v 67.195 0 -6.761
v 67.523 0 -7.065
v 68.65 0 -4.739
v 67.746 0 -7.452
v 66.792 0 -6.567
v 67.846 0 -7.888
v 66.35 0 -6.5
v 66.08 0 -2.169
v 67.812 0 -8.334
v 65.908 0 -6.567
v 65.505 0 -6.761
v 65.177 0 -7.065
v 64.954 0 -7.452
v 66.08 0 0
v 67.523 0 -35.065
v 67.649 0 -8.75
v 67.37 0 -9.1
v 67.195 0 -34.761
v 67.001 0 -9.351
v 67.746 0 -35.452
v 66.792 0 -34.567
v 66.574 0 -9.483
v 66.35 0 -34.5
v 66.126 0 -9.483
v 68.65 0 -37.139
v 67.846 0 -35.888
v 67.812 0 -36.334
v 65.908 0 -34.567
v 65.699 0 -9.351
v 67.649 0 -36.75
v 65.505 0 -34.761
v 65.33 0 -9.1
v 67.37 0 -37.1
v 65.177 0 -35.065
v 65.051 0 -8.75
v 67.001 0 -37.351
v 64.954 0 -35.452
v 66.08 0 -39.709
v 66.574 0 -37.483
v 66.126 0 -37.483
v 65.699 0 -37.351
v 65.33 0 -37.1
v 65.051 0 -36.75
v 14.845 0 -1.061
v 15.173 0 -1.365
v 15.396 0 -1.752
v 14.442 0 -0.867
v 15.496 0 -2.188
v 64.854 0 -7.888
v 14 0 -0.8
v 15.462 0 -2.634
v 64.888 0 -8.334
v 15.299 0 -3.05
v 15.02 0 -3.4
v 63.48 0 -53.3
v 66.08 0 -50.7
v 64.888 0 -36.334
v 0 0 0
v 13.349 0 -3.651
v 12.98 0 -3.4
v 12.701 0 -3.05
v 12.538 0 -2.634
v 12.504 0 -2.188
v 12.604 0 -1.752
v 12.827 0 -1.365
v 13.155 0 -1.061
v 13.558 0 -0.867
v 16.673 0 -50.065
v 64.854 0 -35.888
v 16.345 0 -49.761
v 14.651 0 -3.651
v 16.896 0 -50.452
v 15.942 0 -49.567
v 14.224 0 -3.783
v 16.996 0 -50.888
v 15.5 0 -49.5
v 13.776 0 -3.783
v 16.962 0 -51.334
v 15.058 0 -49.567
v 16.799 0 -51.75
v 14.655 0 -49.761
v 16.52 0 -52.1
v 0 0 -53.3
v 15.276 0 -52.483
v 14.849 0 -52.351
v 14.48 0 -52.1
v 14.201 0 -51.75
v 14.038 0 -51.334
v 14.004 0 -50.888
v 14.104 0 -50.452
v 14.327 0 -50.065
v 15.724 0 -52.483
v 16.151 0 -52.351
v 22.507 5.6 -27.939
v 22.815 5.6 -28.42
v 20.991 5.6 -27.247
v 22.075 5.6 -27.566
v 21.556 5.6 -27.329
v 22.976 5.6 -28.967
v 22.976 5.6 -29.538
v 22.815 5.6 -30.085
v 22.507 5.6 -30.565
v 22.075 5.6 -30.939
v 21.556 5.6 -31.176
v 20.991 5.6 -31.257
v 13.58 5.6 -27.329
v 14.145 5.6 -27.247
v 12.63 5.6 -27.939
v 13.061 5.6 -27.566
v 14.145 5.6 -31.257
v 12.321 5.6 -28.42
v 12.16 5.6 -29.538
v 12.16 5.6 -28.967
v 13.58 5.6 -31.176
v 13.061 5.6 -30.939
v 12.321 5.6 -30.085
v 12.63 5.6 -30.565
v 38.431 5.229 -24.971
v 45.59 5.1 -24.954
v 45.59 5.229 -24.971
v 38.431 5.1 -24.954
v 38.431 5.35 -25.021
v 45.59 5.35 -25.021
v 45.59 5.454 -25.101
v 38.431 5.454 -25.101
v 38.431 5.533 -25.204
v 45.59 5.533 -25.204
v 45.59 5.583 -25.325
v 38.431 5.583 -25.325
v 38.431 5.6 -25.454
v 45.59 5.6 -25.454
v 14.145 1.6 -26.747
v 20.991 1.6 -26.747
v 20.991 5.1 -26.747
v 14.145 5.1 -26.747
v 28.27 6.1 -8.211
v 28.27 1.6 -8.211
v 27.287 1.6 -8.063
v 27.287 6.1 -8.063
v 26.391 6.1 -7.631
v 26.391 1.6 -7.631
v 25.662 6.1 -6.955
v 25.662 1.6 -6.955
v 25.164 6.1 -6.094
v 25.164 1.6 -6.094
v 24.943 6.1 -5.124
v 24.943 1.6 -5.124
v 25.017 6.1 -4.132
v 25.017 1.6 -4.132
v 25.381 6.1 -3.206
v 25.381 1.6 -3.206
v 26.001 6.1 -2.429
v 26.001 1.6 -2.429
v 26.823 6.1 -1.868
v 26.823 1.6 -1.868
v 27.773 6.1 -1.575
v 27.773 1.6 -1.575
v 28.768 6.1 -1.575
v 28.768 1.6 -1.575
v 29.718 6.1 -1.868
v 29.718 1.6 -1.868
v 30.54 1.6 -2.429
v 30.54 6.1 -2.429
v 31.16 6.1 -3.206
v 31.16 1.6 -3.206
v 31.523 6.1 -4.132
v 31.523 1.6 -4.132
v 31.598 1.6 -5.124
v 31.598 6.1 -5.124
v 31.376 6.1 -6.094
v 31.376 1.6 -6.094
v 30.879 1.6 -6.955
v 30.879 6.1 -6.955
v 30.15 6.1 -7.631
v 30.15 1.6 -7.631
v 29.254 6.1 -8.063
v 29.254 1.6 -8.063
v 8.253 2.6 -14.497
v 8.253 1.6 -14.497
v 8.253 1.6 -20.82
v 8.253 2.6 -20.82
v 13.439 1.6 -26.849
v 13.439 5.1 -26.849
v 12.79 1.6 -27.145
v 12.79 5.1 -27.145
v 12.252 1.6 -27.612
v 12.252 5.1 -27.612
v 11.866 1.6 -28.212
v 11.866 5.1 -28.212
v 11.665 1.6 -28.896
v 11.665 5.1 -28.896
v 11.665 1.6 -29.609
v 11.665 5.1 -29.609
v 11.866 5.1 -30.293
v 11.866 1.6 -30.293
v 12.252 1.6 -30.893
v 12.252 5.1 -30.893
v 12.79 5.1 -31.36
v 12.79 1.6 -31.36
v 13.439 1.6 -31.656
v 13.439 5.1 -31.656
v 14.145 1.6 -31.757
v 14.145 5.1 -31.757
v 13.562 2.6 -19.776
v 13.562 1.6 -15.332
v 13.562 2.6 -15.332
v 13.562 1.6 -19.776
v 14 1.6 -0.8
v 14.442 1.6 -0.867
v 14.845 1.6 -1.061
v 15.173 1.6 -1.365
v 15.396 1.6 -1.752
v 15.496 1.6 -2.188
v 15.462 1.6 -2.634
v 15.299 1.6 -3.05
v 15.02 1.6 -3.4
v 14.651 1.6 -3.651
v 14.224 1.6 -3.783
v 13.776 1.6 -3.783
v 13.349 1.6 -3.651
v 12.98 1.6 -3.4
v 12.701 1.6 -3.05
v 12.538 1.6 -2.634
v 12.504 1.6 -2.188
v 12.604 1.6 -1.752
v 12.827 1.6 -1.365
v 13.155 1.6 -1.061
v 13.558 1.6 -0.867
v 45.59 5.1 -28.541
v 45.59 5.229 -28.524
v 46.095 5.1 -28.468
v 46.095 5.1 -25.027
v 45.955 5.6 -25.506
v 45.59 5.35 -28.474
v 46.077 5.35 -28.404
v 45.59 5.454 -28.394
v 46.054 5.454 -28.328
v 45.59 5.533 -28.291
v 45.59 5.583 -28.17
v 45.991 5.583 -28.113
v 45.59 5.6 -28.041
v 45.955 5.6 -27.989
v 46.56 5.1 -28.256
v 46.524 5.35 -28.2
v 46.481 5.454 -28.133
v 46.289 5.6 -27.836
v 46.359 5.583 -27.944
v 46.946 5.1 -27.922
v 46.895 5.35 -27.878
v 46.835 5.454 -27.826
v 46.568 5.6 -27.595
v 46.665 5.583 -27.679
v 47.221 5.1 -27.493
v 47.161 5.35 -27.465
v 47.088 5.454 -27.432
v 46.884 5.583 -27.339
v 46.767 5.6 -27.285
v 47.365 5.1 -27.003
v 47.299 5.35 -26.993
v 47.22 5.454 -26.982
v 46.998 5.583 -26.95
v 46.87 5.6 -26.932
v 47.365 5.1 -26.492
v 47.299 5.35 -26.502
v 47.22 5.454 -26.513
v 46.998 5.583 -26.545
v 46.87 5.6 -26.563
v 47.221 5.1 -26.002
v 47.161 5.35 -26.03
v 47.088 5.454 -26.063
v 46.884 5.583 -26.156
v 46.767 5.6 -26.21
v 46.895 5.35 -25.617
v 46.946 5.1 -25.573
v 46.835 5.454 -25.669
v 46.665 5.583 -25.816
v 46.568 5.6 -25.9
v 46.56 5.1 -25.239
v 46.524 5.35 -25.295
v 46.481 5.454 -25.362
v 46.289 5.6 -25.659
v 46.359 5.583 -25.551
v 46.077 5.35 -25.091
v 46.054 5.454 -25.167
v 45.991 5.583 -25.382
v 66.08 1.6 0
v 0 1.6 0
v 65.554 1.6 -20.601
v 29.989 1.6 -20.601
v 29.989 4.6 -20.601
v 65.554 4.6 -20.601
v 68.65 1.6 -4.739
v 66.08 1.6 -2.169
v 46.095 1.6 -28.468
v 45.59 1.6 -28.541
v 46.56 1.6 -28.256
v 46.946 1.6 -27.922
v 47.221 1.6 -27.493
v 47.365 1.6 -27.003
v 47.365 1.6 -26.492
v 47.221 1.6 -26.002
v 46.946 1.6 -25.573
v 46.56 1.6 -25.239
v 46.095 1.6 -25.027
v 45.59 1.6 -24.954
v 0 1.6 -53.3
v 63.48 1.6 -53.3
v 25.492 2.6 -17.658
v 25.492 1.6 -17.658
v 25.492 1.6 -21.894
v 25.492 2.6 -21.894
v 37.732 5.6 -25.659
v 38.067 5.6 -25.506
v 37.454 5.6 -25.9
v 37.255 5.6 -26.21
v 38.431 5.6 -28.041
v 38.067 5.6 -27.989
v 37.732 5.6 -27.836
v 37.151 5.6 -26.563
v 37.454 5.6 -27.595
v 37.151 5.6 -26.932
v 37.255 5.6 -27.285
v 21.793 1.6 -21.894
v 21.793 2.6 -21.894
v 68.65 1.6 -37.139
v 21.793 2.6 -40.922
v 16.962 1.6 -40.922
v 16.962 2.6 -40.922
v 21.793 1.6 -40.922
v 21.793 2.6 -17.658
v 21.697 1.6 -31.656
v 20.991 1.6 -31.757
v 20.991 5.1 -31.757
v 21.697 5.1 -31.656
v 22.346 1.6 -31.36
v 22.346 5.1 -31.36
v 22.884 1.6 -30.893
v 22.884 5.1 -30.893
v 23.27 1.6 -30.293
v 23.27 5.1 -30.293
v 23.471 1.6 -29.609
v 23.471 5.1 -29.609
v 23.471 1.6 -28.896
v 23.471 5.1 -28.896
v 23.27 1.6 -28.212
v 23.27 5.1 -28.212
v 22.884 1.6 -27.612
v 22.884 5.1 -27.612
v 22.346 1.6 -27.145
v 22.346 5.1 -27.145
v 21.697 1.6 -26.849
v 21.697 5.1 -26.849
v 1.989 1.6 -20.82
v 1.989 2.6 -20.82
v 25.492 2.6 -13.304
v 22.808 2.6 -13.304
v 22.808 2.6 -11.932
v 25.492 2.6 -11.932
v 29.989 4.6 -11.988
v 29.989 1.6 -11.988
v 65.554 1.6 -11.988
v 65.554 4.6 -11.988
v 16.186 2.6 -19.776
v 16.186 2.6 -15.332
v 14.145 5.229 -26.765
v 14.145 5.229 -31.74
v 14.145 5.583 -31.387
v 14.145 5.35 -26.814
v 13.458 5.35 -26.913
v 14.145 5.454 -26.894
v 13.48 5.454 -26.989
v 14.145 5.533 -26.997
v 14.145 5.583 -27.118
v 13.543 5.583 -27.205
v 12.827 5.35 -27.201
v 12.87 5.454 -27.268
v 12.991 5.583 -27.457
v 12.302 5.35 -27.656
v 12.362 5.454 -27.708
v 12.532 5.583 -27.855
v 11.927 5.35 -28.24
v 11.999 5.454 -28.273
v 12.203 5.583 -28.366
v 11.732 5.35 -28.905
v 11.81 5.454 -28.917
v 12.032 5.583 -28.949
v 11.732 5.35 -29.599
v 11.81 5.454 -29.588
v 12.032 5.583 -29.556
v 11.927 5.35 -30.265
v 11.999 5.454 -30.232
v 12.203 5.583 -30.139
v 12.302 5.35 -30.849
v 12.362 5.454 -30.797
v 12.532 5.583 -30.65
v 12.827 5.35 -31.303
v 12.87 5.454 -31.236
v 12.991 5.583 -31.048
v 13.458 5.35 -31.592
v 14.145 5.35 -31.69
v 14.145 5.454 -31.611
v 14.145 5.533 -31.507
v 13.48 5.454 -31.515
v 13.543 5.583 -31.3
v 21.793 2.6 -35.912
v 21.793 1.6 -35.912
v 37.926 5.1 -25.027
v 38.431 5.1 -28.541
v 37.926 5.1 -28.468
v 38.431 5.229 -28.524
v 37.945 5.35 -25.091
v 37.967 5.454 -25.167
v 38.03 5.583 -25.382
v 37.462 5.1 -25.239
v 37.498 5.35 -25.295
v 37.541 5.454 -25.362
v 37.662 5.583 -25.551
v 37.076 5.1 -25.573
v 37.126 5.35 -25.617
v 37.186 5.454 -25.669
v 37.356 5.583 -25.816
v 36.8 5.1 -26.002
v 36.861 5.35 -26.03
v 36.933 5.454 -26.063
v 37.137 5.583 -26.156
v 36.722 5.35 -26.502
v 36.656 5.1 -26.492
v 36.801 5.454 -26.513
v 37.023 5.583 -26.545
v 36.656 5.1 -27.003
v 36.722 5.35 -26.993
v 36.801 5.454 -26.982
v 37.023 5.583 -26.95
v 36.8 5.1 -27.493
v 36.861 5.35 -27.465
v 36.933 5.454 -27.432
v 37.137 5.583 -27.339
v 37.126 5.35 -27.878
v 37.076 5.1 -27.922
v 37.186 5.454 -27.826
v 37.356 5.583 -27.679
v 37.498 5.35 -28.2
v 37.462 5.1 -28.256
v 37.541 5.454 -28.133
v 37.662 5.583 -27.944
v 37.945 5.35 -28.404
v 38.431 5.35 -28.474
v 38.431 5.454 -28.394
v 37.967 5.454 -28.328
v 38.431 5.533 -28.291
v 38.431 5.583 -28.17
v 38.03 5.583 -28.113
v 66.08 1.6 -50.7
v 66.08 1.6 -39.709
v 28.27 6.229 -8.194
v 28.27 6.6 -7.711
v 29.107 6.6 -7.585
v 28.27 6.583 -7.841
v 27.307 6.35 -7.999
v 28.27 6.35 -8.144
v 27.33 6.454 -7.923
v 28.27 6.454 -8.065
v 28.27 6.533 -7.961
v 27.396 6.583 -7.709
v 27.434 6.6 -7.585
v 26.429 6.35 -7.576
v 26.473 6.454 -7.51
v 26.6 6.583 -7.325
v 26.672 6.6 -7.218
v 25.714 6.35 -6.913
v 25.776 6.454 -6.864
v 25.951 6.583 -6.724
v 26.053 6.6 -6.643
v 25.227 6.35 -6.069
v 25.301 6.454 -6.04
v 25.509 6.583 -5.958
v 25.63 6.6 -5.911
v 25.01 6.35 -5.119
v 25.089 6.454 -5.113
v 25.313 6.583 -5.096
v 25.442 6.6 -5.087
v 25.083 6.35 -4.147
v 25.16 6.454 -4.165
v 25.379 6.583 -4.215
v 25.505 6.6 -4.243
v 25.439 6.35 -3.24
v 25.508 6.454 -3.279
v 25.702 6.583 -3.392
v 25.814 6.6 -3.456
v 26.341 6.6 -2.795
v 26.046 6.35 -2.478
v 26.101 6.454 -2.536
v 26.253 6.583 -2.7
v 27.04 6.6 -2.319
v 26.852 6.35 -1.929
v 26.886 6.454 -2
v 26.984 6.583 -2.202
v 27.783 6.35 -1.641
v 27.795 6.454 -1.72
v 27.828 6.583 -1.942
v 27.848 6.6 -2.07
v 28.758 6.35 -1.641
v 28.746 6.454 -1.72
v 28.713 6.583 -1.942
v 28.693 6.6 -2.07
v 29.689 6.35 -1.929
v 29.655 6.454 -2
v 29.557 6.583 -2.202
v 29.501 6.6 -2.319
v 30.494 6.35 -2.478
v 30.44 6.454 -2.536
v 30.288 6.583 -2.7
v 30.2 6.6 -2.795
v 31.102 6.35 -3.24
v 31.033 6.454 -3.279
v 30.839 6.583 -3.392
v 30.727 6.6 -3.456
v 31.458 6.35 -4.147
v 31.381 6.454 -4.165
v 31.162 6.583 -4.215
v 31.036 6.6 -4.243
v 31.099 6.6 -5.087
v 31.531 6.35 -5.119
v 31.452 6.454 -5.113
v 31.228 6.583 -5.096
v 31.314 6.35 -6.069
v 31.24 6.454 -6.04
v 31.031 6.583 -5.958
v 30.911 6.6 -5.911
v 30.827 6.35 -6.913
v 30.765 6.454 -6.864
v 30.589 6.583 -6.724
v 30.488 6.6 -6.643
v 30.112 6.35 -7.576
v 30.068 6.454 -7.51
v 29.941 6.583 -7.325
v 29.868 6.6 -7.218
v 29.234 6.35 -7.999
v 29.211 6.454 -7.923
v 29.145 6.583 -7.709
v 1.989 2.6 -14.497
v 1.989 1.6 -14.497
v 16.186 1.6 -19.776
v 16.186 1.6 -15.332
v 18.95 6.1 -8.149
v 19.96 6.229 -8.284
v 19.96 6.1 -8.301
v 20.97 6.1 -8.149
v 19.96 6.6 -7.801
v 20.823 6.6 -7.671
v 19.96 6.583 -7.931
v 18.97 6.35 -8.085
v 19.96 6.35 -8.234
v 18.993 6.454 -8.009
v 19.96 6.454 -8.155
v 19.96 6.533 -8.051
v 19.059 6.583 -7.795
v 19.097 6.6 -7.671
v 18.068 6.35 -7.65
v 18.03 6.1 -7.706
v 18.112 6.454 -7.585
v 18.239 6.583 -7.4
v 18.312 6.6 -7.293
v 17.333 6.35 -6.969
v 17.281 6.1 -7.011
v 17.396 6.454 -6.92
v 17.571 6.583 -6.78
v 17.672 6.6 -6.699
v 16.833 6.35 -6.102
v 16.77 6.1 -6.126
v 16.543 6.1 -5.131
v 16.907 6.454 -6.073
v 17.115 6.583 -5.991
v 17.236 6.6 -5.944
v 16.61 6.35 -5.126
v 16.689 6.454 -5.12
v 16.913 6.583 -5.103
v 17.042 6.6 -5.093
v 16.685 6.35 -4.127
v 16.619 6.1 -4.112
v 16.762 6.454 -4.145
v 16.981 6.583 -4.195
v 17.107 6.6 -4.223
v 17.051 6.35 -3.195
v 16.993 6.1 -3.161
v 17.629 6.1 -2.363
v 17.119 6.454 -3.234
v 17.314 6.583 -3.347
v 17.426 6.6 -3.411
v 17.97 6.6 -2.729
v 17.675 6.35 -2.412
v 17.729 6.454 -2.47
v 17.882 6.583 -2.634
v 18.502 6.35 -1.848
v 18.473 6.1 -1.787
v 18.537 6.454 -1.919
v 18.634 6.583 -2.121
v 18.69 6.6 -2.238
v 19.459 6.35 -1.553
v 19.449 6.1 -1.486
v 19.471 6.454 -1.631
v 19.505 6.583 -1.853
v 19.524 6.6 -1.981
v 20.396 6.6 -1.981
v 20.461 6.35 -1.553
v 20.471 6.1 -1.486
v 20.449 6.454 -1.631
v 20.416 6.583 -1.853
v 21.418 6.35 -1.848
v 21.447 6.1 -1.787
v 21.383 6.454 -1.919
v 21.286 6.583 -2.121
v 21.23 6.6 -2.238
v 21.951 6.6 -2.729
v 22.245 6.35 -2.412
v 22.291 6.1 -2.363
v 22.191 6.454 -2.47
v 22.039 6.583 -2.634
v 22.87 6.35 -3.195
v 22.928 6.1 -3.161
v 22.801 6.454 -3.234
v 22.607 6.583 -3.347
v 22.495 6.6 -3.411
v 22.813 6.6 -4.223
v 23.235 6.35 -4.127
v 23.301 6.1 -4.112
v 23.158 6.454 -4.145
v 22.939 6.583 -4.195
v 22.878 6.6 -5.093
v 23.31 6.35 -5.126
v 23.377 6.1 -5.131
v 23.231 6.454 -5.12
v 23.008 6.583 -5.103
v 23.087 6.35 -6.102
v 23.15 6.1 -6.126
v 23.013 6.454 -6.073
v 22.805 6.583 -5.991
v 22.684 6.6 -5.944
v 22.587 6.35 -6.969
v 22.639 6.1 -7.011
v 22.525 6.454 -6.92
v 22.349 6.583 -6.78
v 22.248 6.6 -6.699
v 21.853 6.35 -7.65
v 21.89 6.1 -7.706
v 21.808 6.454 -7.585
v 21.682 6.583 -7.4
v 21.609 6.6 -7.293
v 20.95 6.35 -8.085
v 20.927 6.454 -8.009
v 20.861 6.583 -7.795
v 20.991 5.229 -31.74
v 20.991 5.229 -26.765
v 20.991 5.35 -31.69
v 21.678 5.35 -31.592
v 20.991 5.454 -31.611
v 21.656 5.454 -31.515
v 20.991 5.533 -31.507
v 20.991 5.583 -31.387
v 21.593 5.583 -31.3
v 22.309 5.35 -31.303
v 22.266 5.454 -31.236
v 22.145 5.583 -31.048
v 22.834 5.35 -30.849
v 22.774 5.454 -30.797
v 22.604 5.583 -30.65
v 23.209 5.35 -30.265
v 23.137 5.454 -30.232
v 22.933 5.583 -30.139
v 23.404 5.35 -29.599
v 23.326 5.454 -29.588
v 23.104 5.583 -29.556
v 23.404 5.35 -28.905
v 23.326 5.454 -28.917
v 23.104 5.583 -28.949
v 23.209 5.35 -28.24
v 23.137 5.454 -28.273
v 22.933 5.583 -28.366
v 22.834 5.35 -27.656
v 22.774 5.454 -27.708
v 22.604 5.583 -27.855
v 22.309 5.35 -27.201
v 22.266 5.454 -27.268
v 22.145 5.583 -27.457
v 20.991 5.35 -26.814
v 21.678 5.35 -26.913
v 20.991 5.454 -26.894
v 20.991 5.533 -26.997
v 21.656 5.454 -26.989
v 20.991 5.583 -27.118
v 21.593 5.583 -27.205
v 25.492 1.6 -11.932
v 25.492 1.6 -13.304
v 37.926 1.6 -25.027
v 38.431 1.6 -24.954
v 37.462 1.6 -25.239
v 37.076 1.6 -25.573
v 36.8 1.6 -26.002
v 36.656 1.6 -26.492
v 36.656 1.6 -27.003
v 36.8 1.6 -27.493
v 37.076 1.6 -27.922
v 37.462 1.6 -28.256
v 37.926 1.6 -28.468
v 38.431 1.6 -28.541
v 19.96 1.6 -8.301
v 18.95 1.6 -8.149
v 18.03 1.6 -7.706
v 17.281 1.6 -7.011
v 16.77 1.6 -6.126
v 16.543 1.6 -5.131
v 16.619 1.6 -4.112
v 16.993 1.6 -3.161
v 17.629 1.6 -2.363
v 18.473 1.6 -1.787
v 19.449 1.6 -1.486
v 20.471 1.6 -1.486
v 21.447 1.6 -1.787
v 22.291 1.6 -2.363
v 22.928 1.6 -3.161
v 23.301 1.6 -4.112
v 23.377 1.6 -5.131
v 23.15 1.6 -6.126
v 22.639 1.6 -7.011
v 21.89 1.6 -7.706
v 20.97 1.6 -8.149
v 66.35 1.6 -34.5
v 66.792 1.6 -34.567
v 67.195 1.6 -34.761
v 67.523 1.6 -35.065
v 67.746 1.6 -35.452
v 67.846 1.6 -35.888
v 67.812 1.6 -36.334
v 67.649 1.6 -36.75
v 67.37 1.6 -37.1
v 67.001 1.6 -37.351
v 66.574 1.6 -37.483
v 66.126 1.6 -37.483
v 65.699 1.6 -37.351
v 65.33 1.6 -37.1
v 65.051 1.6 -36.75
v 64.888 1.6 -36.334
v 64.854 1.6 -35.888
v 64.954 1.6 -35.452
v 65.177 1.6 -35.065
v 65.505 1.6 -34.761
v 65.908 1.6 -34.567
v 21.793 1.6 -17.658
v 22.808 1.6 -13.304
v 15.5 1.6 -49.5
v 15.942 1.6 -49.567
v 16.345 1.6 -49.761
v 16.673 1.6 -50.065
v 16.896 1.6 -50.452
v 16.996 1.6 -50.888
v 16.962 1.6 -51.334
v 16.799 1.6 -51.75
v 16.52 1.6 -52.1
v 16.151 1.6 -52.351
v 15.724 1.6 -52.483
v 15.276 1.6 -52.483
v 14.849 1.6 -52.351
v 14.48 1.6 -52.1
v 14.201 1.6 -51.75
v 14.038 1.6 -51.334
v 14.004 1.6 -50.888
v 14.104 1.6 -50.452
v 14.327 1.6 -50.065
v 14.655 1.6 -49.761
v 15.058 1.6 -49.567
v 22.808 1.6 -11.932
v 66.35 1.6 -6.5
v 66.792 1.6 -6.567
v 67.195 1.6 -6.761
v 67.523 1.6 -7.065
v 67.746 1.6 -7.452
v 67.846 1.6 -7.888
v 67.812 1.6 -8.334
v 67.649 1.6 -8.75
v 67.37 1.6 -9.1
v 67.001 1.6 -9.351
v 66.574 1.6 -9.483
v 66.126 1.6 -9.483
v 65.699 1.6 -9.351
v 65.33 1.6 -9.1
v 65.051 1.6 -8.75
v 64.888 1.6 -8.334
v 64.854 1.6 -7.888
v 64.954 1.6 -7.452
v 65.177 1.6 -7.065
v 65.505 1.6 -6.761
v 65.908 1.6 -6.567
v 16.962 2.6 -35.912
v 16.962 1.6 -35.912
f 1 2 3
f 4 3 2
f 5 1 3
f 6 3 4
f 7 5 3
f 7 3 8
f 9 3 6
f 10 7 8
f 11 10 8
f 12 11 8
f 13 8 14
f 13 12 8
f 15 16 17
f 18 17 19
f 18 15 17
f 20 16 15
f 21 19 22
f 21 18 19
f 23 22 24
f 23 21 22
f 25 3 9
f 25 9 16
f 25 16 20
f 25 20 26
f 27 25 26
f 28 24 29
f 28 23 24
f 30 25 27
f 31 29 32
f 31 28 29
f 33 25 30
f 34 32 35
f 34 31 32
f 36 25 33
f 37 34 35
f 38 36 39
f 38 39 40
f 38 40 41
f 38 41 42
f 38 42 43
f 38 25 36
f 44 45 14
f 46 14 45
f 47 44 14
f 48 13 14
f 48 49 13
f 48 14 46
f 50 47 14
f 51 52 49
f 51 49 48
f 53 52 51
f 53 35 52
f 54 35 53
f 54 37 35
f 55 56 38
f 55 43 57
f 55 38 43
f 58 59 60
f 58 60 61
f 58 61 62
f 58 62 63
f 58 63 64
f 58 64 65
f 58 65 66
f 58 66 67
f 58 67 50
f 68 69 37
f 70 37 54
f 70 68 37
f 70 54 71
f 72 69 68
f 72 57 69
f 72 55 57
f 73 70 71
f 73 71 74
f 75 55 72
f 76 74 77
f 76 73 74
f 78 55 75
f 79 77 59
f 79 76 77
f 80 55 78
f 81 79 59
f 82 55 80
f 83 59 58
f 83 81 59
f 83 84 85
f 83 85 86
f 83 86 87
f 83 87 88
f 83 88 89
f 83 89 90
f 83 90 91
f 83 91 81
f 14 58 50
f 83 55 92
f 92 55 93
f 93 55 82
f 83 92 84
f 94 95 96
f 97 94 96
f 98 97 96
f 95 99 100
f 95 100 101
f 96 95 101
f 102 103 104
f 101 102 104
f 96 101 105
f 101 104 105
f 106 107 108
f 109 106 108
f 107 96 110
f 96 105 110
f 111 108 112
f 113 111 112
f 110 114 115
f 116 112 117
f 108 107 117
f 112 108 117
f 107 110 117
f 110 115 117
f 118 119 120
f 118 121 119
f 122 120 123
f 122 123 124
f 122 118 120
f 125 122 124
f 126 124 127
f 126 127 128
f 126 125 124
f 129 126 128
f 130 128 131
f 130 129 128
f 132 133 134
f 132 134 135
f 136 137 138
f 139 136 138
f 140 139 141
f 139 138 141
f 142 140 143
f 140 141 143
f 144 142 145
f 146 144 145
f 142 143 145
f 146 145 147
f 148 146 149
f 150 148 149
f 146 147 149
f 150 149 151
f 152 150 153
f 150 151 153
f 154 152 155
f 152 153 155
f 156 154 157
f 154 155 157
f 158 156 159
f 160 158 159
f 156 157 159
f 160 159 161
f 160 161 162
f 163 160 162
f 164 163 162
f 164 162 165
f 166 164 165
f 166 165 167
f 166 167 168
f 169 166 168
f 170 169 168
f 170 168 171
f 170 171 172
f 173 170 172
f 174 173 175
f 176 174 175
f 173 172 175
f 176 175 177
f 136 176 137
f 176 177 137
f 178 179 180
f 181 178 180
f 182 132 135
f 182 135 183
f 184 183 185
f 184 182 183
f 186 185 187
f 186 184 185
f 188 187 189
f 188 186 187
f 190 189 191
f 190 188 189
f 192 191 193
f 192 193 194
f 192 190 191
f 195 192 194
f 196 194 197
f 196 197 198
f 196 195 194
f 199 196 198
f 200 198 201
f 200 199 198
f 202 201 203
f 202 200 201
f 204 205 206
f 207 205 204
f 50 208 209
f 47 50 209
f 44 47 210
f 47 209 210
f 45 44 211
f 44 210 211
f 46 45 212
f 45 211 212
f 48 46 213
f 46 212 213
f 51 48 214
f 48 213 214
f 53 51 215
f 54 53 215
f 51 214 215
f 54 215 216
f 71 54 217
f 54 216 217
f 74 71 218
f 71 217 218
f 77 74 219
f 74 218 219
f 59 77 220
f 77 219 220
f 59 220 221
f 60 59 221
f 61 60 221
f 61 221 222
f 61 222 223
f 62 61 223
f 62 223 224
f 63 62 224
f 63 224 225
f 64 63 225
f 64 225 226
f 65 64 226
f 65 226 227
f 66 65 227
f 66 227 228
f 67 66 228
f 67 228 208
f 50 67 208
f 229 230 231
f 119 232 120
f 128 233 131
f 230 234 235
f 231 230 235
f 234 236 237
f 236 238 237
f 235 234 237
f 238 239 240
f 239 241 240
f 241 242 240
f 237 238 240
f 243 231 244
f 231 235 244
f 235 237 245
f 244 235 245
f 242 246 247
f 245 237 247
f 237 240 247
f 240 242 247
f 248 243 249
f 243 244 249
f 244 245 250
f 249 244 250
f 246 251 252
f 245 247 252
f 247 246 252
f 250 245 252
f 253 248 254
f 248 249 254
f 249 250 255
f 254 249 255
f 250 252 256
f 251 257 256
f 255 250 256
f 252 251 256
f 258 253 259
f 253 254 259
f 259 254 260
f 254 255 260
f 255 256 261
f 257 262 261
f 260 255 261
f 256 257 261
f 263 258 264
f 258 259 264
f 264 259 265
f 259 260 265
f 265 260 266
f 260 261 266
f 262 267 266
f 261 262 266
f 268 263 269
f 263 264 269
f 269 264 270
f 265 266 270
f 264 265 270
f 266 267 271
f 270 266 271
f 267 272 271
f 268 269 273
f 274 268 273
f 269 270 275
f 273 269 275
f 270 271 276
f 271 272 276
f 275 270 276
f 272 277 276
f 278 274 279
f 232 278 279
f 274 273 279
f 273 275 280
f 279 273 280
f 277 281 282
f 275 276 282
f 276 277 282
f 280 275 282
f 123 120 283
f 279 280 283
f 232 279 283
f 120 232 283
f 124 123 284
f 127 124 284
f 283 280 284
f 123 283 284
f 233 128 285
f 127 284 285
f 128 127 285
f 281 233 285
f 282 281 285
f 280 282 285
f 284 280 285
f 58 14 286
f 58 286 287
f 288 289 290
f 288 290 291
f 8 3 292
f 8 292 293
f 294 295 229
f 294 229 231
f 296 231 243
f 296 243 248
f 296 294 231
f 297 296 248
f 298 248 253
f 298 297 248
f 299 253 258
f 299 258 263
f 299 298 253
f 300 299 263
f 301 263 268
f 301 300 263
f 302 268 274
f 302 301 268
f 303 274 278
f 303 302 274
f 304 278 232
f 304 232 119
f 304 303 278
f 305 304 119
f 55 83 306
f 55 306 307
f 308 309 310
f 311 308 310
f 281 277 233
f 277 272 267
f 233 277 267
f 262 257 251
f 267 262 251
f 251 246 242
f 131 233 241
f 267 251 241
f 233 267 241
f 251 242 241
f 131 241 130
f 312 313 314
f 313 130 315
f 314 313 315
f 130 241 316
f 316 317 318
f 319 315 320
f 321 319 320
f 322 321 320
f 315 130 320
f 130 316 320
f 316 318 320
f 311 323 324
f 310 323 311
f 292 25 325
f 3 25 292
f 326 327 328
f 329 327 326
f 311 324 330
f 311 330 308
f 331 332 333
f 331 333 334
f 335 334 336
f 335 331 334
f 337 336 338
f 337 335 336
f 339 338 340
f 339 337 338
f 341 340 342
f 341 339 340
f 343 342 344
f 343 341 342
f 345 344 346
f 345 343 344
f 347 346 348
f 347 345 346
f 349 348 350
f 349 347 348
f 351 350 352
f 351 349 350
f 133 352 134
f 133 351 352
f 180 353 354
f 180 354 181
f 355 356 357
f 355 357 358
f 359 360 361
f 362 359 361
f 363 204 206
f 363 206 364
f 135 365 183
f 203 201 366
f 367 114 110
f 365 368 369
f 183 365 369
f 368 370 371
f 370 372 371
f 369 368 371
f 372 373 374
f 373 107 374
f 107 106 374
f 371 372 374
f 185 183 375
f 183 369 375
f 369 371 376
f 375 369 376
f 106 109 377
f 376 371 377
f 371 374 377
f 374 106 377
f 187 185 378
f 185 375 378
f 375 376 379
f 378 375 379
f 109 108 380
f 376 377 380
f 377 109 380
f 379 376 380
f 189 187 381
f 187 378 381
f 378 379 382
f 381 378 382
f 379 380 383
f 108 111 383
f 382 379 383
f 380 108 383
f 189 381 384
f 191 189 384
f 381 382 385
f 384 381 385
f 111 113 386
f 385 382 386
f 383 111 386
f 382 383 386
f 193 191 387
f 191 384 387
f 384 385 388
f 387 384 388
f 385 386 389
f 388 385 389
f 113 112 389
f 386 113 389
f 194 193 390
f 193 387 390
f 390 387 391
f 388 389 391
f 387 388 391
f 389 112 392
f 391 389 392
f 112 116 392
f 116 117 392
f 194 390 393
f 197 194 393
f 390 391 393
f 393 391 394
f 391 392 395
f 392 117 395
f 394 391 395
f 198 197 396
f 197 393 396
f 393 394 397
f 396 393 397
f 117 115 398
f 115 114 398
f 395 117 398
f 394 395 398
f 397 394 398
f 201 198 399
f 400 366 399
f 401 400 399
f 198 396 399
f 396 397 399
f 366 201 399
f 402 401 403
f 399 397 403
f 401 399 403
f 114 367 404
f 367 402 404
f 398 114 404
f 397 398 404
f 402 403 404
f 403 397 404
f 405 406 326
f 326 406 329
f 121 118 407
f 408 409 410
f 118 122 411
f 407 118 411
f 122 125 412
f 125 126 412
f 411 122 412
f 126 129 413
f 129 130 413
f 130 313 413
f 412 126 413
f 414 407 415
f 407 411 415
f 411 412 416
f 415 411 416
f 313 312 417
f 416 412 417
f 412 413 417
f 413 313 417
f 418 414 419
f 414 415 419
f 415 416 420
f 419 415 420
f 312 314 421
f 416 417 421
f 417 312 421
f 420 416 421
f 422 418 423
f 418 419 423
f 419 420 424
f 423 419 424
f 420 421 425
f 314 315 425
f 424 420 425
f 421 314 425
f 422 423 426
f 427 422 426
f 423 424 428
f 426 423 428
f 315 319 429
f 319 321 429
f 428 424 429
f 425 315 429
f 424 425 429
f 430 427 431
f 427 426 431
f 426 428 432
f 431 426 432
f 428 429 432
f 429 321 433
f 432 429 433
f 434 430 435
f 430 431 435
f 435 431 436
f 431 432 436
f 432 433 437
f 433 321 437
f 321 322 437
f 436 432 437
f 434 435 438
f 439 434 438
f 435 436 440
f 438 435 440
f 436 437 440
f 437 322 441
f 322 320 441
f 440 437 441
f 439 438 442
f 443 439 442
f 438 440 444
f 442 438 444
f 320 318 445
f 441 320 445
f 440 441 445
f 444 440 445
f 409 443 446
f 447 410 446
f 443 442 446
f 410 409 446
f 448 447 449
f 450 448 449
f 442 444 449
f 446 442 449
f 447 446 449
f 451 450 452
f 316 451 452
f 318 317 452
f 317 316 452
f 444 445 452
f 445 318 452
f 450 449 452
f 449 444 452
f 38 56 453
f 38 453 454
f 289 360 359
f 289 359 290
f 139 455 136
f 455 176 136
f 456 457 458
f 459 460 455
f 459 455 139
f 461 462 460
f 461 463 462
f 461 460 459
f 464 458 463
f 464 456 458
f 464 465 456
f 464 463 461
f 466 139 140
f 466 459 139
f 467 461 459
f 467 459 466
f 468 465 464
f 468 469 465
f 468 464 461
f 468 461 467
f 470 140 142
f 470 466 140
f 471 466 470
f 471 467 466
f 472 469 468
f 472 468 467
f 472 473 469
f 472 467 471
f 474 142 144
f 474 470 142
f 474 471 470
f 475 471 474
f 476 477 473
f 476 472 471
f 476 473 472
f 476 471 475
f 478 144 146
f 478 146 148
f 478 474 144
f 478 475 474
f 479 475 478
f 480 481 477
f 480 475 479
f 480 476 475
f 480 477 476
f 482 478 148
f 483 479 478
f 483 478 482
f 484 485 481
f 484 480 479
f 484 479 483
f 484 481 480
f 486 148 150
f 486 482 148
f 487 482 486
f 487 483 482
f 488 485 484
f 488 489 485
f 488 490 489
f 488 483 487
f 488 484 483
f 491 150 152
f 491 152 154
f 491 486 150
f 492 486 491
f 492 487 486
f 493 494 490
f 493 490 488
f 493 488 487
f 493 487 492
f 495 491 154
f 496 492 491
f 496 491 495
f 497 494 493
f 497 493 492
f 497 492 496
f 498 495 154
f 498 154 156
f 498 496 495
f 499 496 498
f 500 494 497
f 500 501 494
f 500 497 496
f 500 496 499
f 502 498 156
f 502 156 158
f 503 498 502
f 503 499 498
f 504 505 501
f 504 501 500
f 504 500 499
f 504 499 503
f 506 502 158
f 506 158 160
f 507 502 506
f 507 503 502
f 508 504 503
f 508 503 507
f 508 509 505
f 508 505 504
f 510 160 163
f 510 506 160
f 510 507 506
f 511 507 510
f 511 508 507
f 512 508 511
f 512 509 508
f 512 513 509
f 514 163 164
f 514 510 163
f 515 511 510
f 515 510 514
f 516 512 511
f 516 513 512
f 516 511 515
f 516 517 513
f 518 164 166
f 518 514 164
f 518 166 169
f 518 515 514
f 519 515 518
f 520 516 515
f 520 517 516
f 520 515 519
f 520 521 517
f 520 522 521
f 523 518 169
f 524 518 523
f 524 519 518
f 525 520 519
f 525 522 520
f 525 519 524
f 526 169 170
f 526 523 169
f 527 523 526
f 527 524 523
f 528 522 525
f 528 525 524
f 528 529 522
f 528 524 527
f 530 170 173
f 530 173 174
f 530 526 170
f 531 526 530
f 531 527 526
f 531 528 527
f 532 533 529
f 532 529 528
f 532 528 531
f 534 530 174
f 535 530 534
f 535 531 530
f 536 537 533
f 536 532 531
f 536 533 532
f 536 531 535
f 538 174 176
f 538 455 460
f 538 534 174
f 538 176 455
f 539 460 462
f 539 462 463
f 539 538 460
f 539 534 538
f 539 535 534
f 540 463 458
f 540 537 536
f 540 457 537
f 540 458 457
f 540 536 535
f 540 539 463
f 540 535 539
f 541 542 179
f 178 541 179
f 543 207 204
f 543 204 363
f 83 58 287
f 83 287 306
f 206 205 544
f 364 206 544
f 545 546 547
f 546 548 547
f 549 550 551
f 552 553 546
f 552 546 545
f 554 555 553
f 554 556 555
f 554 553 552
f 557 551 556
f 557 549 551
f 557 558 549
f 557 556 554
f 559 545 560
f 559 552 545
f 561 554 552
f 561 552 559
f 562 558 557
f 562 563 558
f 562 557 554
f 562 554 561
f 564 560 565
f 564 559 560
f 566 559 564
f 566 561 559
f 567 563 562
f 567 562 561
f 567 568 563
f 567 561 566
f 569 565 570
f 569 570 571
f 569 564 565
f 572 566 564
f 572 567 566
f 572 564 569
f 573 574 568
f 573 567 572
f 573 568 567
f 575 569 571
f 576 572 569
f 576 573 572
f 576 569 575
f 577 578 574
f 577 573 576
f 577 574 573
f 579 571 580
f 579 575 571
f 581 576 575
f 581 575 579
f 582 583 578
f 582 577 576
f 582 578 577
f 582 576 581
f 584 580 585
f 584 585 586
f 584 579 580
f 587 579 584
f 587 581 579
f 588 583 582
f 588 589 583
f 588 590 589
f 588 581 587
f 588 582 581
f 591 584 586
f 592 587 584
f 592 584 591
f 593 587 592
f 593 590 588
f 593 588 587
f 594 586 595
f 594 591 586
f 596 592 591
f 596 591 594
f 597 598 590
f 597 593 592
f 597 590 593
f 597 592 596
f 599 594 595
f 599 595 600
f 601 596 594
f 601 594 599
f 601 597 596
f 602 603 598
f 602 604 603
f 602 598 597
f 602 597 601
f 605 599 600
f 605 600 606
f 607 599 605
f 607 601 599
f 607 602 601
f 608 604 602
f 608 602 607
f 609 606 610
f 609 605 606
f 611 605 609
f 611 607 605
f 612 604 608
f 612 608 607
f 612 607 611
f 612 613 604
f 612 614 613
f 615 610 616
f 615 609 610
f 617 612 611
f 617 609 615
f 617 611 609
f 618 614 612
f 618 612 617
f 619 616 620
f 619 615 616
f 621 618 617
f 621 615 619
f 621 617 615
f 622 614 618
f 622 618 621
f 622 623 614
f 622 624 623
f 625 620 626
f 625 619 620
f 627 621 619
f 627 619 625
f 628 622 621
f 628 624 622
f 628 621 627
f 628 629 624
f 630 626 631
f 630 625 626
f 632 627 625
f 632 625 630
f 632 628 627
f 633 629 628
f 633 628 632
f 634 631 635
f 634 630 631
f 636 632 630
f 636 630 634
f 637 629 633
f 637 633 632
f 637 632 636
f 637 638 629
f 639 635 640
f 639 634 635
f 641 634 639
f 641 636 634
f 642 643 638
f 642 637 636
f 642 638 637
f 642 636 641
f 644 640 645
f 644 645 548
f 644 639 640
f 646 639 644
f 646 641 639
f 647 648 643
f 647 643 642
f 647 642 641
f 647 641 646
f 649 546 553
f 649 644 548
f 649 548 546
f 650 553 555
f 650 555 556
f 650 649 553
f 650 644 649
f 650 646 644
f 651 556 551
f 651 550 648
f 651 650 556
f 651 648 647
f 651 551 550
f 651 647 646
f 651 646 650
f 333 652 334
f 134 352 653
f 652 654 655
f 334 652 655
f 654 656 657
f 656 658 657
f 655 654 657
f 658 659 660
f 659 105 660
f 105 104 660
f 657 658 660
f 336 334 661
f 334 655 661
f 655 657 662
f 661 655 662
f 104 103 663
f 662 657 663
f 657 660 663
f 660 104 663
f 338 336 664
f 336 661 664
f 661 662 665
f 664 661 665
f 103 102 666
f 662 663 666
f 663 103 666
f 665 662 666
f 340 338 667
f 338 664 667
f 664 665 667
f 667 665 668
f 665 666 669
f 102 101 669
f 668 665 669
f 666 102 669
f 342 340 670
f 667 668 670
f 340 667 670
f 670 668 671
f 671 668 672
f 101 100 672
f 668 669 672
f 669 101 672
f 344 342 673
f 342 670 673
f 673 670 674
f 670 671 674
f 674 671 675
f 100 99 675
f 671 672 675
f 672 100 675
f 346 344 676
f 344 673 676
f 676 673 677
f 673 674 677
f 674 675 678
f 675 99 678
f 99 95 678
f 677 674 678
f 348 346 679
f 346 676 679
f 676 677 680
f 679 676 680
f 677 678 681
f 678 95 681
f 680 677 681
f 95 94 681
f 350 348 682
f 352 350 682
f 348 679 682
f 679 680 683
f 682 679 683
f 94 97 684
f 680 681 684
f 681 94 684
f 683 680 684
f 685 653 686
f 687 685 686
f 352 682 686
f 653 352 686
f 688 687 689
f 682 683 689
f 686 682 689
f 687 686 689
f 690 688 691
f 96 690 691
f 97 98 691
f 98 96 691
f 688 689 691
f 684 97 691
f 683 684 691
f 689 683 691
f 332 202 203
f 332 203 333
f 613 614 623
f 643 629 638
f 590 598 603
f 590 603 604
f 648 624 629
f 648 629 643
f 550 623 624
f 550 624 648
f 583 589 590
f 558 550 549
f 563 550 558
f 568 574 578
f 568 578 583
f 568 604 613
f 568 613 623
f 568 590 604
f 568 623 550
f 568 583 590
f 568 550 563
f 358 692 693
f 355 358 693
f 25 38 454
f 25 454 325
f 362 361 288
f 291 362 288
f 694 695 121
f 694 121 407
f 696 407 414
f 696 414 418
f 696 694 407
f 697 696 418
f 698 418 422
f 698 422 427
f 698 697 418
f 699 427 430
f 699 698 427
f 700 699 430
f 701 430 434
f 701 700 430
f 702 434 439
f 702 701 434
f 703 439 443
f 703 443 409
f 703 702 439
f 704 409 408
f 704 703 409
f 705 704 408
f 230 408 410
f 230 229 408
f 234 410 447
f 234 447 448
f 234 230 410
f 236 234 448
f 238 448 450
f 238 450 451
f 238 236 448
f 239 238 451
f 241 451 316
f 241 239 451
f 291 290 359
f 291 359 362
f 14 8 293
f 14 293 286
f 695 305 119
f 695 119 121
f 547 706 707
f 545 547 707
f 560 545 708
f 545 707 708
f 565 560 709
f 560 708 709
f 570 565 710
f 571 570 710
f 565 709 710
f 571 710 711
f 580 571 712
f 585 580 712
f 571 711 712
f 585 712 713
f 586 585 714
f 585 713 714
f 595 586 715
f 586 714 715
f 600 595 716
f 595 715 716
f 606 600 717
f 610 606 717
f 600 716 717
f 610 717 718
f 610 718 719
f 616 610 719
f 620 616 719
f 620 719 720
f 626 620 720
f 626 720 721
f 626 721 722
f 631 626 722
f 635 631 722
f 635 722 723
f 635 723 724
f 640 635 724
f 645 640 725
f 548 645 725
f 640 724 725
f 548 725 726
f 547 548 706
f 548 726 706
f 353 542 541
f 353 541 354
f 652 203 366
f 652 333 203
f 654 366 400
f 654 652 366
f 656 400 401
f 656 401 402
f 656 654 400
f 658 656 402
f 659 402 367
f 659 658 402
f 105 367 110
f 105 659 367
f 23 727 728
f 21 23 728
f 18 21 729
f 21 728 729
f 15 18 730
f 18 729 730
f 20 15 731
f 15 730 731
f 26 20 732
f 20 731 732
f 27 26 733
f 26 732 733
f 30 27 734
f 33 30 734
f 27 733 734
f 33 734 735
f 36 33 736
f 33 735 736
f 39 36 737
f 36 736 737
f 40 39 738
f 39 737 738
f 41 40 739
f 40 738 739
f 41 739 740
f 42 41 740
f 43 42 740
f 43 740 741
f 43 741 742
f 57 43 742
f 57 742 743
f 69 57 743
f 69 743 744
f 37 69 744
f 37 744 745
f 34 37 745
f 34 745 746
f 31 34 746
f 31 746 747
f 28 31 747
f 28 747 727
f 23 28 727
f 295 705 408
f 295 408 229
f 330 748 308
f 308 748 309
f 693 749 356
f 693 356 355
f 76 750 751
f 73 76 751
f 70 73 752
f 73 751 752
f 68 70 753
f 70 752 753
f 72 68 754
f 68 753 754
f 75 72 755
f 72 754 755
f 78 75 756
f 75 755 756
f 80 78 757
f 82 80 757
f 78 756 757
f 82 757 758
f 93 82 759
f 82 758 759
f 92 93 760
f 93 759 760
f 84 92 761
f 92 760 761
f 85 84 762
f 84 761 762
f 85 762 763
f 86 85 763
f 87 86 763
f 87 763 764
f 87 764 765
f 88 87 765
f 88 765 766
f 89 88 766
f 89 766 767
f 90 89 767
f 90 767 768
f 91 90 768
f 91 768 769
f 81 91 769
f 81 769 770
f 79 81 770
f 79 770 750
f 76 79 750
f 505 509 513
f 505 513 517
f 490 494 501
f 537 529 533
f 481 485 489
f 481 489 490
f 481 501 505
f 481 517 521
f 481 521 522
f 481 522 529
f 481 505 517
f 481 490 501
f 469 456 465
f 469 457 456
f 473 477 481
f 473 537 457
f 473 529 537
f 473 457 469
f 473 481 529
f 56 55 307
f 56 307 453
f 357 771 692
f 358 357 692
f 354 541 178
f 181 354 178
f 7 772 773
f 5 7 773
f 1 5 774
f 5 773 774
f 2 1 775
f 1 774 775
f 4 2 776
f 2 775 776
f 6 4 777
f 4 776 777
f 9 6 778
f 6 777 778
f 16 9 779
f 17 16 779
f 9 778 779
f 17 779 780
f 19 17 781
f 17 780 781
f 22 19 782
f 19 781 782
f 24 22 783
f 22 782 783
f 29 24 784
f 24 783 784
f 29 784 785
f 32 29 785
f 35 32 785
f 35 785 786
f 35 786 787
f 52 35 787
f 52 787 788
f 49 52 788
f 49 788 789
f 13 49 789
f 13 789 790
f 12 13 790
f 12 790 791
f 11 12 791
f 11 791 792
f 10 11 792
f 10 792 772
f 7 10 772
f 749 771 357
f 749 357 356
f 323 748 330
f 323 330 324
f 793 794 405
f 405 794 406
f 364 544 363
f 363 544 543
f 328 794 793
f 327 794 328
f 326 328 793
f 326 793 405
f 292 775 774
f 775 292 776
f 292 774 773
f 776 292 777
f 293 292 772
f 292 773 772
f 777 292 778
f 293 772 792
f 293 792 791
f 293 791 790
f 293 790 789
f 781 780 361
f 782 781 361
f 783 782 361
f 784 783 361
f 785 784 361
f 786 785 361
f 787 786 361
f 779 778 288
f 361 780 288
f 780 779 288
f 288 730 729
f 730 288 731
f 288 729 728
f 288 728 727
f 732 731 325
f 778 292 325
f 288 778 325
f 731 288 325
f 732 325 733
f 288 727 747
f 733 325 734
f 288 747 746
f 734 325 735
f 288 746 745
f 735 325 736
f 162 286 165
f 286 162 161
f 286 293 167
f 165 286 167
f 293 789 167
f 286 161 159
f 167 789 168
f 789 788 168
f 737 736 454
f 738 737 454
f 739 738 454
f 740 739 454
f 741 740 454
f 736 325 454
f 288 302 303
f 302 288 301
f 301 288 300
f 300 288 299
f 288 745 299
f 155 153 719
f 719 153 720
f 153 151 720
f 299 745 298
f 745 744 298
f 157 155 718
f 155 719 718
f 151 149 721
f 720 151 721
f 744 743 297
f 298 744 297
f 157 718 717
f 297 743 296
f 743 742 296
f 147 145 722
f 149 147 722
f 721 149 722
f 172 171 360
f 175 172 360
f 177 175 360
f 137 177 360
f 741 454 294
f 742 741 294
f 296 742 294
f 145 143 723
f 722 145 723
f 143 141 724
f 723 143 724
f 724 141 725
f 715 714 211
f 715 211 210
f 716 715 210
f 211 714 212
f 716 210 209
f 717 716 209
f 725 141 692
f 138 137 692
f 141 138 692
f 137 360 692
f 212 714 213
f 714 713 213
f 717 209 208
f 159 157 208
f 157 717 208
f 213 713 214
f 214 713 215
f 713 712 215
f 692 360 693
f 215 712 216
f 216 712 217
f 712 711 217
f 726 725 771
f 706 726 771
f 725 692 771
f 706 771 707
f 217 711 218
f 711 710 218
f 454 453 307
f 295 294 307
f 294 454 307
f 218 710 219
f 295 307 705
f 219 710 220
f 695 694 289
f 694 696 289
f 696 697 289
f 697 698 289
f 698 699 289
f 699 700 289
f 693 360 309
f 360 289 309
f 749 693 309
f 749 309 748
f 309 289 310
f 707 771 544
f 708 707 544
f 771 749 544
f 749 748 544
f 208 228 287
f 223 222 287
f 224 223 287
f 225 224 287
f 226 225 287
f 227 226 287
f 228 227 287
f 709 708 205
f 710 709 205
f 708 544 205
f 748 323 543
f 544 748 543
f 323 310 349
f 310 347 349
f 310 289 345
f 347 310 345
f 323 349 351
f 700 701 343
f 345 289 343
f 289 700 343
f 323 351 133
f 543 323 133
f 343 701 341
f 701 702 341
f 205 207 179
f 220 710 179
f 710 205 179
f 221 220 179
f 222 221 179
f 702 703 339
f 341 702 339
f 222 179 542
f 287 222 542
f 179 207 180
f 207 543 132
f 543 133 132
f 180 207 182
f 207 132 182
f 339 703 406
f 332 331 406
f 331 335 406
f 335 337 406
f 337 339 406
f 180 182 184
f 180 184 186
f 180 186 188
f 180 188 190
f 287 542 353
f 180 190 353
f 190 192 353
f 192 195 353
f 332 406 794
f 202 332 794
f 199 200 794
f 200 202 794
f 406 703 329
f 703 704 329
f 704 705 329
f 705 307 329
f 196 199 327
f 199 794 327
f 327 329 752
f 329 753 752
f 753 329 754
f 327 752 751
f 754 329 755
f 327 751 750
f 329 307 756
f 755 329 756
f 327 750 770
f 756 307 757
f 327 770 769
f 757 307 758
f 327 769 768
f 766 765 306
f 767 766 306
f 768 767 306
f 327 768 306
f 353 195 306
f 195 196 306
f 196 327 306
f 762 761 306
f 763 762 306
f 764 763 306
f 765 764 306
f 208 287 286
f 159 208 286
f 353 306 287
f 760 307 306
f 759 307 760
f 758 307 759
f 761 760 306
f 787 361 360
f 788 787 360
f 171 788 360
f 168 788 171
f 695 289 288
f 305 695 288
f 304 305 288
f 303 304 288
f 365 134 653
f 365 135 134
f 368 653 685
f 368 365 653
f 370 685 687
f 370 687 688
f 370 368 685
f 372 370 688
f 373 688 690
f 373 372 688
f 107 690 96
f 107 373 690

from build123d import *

# Parameters (mm, degrees)
SALIENTE_EXTRUIR1_DEPTH = 1.6
CHAFL_N1_SIZE           = 2.6
CROQUIS2_R              = 1.5
CORTAR_EXTRUIR1_DEPTH   = 87.926822673
CROQUIS3_W              = 35.565034919
CROQUIS3_H              = 8.613377017
SALIENTE_EXTRUIR2_DEPTH = 3
CROQUIS4_R              = 3.336672647
CROQUIS4_R_2            = 3.426556793
SALIENTE_EXTRUIR3_DEPTH = 5
CROQUIS5_W              = 6.263410385
CROQUIS5_H              = 6.323061912
CROQUIS5_W_2            = 3.698394703
CROQUIS5_H_2            = 4.23525845
CROQUIS5_W_3            = 2.624667209
CROQUIS5_H_3            = 4.444038797
CROQUIS5_W_4            = 2.684318736
CROQUIS5_H_4            = 1.371985132
CROQUIS5_W_5            = 4.831773725
CROQUIS5_H_5            = 5.010728307
SALIENTE_EXTRUIR4_DEPTH = 1
SALIENTE_EXTRUIR5_DEPTH = 4
REDONDEO1_R             = 0.5


with BuildPart() as part:
    # Croquis1 → Saliente-Extruir1 (new body)
    with BuildSketch(Plane(origin=(0, 0, 0), x_dir=(1, 0, 0), z_dir=(0, 1, 0))):
        Polygon((0, 53.3), (66.08, 53.3), (66.08, 39.738845798), (68.65, 39.738845798), (68.65, 2.138845798), (66.08, 2.138845798), (66.08, 0), (0, 0), align=None)
    extrude(amount=SALIENTE_EXTRUIR1_DEPTH)

    # Chaflán1
    # the kernel refuses this chamfer: 2.6 mm, written as the material it takes off along each edge
    with BuildSketch(Plane(origin=(68.65, -6.686375769, -39.738845798), x_dir=(-0.9996219169112966, 0, -0.027495876610585446), z_dir=(0, 1, 0))) as chafl_n1_piece_1_section:
        Polygon((CHAFL_N1_SIZE * 0.999621916911, CHAFL_N1_SIZE * 0.0274958766106), (-CHAFL_N1_SIZE * 0.0274958766106, CHAFL_N1_SIZE * 0.999621916911), (0, 0), align=None)
    chafl_n1_piece_1 = extrude(amount=14.972751537, mode=Mode.PRIVATE)
    chafl_n1_piece_1 = split(chafl_n1_piece_1, bisect_by=Plane(origin=(66.08, 0.8, -38.878812764), z_dir=(1, 0, 0)), keep=Keep.TOP, mode=Mode.PRIVATE)
    add(chafl_n1_piece_1, mode=Mode.SUBTRACT)
    with BuildSketch(Plane(origin=(68.65, -6.686375769, -2.138845798), x_dir=(0.027495876610585345, 0, -0.9996219169112966), z_dir=(0, 1, 0))) as chafl_n1_piece_2_section:
        Polygon((CHAFL_N1_SIZE * 0.999621916911, CHAFL_N1_SIZE * 0.0274958766106), (-CHAFL_N1_SIZE * 0.0274958766106, CHAFL_N1_SIZE * 0.999621916911), (0, 0), align=None)
    chafl_n1_piece_2 = extrude(amount=14.972751537, mode=Mode.PRIVATE)
    chafl_n1_piece_2 = split(chafl_n1_piece_2, bisect_by=Plane(origin=(66.08, 0.8, -2.998878832), z_dir=(1, 0, 0)), keep=Keep.TOP, mode=Mode.PRIVATE)
    add(chafl_n1_piece_2, mode=Mode.SUBTRACT)
    with BuildSketch(Plane(origin=(66.08, -6.686375769, -53.3), x_dir=(-0.9996219169112966, 0, -0.027495876610585373), z_dir=(0, 1, 0))) as chafl_n1_piece_3:
        Polygon((CHAFL_N1_SIZE * 0.999621916911, CHAFL_N1_SIZE * 0.0274958766106), (-CHAFL_N1_SIZE * 0.0274958766106, CHAFL_N1_SIZE * 0.999621916911), (0, 0), align=None)
    extrude(amount=14.972751537, mode=Mode.SUBTRACT)

    # Croquis2 → Cortar-Extruir1 (cut, through all)
    with BuildSketch(Plane(origin=(0, 1.6, 0), x_dir=(1, 0, 0), z_dir=(0, 1, 0))):
        with Locations(Location((15.5, 51, 0), (0, 0, 270))):
            Circle(CROQUIS2_R)
        with Locations(Location((66.35, 36, 0), (0, 0, 270))):
            Circle(CROQUIS2_R)
        with Locations(Location((66.35, 8, 0), (0, 0, 270))):
            Circle(CROQUIS2_R)
        with Locations(Location((14, 2.3, 0), (0, 0, 270))):
            Circle(CROQUIS2_R)
    extrude(amount=-CORTAR_EXTRUIR1_DEPTH, mode=Mode.SUBTRACT)

    # Croquis3 → Saliente-Extruir2 (add)
    with BuildSketch(Plane(origin=(0, 1.6, 0), x_dir=(1, 0, 0), z_dir=(0, 1, 0))):
        with Locations((47.771511194, 16.294435422)):
            Rectangle(CROQUIS3_W, CROQUIS3_H)
    extrude(amount=SALIENTE_EXTRUIR2_DEPTH)

    # Croquis4 → Saliente-Extruir3 (add)
    with BuildSketch(Plane(origin=(0, 1.6, 0), x_dir=(1, 0, 0), z_dir=(0, 1, 0))):
        with Locations(Location((28.27044436, 4.874550457, 0), (0, 0, 90))):
            Circle(CROQUIS4_R)
        with Locations(Location((19.960106187, 4.874550457, 0), (0, 0, 90))):
            Circle(CROQUIS4_R_2)
    extrude(amount=SALIENTE_EXTRUIR3_DEPTH)

    # Croquis5 → Saliente-Extruir4 (add)
    with BuildSketch(Plane(origin=(0, 1.6, 0), x_dir=(1, 0, 0), z_dir=(0, 1, 0))):
        with Locations((5.120871528, 17.658331847)):
            Rectangle(CROQUIS5_W, CROQUIS5_H)
        with Locations((23.642670808, 19.775961072)):
            Rectangle(CROQUIS5_W_2, CROQUIS5_H_2)
        with Locations((14.87389627, 17.553941673)):
            Rectangle(CROQUIS5_W_3, CROQUIS5_H_3)
        with Locations((24.149708791, 12.617777775)):
            Rectangle(CROQUIS5_W_4, CROQUIS5_H_4)
        with Locations((19.377586593, 38.417063407)):
            Rectangle(CROQUIS5_W_5, CROQUIS5_H_5)
    extrude(amount=SALIENTE_EXTRUIR4_DEPTH)

    # Croquis6 → Saliente-Extruir5 (add)
    with BuildSketch(Plane(origin=(0, 1.6, 0), x_dir=(1, 0, 0), z_dir=(0, 1, 0))):
        with BuildLine():
            Line((14.144691977, 31.757239244), (20.991330498, 31.757239244))
            ThreePointArc((20.991330498, 31.757239244), (23.496200875, 29.252368867), (20.991330498, 26.74749849))
            Line((20.991330498, 26.74749849), (14.144691977, 26.74749849))
            ThreePointArc((14.144691977, 26.74749849), (11.6398216, 29.252368867), (14.144691977, 31.757239244))
        make_face()
        with BuildLine():
            Line((38.431163378, 28.540921146), (45.590129983, 28.540921146))
            ThreePointArc((45.590129983, 28.540921146), (47.383552638, 26.74749849), (45.590129983, 24.954075835))
            Line((45.590129983, 24.954075835), (38.431163378, 24.954075835))
            ThreePointArc((38.431163378, 24.954075835), (36.637740722, 26.74749849), (38.431163378, 28.540921146))
        make_face()
    extrude(amount=SALIENTE_EXTRUIR5_DEPTH)

    # Redondeo1
    redondeo1_edges = [part.edges().sort_by_distance(p)[0] for p in [
        (11.6398216, 5.6, -29.252368867),
        (17.568011237, 5.6, -26.74749849),
        (23.496200875, 5.6, -29.252368867),
        (17.568011237, 5.6, -31.757239244),
        (36.637740722, 5.6, -26.74749849),
        (42.01064668, 5.6, -24.954075835),
        (47.383552638, 5.6, -26.74749849),
        (42.01064668, 5.6, -28.540921146),
        (28.27044436, 6.6, -1.53787781),
        (19.960106187, 6.6, -1.447993664),
    ]]
    fillet(redondeo1_edges, radius=REDONDEO1_R)


solid = part.part
